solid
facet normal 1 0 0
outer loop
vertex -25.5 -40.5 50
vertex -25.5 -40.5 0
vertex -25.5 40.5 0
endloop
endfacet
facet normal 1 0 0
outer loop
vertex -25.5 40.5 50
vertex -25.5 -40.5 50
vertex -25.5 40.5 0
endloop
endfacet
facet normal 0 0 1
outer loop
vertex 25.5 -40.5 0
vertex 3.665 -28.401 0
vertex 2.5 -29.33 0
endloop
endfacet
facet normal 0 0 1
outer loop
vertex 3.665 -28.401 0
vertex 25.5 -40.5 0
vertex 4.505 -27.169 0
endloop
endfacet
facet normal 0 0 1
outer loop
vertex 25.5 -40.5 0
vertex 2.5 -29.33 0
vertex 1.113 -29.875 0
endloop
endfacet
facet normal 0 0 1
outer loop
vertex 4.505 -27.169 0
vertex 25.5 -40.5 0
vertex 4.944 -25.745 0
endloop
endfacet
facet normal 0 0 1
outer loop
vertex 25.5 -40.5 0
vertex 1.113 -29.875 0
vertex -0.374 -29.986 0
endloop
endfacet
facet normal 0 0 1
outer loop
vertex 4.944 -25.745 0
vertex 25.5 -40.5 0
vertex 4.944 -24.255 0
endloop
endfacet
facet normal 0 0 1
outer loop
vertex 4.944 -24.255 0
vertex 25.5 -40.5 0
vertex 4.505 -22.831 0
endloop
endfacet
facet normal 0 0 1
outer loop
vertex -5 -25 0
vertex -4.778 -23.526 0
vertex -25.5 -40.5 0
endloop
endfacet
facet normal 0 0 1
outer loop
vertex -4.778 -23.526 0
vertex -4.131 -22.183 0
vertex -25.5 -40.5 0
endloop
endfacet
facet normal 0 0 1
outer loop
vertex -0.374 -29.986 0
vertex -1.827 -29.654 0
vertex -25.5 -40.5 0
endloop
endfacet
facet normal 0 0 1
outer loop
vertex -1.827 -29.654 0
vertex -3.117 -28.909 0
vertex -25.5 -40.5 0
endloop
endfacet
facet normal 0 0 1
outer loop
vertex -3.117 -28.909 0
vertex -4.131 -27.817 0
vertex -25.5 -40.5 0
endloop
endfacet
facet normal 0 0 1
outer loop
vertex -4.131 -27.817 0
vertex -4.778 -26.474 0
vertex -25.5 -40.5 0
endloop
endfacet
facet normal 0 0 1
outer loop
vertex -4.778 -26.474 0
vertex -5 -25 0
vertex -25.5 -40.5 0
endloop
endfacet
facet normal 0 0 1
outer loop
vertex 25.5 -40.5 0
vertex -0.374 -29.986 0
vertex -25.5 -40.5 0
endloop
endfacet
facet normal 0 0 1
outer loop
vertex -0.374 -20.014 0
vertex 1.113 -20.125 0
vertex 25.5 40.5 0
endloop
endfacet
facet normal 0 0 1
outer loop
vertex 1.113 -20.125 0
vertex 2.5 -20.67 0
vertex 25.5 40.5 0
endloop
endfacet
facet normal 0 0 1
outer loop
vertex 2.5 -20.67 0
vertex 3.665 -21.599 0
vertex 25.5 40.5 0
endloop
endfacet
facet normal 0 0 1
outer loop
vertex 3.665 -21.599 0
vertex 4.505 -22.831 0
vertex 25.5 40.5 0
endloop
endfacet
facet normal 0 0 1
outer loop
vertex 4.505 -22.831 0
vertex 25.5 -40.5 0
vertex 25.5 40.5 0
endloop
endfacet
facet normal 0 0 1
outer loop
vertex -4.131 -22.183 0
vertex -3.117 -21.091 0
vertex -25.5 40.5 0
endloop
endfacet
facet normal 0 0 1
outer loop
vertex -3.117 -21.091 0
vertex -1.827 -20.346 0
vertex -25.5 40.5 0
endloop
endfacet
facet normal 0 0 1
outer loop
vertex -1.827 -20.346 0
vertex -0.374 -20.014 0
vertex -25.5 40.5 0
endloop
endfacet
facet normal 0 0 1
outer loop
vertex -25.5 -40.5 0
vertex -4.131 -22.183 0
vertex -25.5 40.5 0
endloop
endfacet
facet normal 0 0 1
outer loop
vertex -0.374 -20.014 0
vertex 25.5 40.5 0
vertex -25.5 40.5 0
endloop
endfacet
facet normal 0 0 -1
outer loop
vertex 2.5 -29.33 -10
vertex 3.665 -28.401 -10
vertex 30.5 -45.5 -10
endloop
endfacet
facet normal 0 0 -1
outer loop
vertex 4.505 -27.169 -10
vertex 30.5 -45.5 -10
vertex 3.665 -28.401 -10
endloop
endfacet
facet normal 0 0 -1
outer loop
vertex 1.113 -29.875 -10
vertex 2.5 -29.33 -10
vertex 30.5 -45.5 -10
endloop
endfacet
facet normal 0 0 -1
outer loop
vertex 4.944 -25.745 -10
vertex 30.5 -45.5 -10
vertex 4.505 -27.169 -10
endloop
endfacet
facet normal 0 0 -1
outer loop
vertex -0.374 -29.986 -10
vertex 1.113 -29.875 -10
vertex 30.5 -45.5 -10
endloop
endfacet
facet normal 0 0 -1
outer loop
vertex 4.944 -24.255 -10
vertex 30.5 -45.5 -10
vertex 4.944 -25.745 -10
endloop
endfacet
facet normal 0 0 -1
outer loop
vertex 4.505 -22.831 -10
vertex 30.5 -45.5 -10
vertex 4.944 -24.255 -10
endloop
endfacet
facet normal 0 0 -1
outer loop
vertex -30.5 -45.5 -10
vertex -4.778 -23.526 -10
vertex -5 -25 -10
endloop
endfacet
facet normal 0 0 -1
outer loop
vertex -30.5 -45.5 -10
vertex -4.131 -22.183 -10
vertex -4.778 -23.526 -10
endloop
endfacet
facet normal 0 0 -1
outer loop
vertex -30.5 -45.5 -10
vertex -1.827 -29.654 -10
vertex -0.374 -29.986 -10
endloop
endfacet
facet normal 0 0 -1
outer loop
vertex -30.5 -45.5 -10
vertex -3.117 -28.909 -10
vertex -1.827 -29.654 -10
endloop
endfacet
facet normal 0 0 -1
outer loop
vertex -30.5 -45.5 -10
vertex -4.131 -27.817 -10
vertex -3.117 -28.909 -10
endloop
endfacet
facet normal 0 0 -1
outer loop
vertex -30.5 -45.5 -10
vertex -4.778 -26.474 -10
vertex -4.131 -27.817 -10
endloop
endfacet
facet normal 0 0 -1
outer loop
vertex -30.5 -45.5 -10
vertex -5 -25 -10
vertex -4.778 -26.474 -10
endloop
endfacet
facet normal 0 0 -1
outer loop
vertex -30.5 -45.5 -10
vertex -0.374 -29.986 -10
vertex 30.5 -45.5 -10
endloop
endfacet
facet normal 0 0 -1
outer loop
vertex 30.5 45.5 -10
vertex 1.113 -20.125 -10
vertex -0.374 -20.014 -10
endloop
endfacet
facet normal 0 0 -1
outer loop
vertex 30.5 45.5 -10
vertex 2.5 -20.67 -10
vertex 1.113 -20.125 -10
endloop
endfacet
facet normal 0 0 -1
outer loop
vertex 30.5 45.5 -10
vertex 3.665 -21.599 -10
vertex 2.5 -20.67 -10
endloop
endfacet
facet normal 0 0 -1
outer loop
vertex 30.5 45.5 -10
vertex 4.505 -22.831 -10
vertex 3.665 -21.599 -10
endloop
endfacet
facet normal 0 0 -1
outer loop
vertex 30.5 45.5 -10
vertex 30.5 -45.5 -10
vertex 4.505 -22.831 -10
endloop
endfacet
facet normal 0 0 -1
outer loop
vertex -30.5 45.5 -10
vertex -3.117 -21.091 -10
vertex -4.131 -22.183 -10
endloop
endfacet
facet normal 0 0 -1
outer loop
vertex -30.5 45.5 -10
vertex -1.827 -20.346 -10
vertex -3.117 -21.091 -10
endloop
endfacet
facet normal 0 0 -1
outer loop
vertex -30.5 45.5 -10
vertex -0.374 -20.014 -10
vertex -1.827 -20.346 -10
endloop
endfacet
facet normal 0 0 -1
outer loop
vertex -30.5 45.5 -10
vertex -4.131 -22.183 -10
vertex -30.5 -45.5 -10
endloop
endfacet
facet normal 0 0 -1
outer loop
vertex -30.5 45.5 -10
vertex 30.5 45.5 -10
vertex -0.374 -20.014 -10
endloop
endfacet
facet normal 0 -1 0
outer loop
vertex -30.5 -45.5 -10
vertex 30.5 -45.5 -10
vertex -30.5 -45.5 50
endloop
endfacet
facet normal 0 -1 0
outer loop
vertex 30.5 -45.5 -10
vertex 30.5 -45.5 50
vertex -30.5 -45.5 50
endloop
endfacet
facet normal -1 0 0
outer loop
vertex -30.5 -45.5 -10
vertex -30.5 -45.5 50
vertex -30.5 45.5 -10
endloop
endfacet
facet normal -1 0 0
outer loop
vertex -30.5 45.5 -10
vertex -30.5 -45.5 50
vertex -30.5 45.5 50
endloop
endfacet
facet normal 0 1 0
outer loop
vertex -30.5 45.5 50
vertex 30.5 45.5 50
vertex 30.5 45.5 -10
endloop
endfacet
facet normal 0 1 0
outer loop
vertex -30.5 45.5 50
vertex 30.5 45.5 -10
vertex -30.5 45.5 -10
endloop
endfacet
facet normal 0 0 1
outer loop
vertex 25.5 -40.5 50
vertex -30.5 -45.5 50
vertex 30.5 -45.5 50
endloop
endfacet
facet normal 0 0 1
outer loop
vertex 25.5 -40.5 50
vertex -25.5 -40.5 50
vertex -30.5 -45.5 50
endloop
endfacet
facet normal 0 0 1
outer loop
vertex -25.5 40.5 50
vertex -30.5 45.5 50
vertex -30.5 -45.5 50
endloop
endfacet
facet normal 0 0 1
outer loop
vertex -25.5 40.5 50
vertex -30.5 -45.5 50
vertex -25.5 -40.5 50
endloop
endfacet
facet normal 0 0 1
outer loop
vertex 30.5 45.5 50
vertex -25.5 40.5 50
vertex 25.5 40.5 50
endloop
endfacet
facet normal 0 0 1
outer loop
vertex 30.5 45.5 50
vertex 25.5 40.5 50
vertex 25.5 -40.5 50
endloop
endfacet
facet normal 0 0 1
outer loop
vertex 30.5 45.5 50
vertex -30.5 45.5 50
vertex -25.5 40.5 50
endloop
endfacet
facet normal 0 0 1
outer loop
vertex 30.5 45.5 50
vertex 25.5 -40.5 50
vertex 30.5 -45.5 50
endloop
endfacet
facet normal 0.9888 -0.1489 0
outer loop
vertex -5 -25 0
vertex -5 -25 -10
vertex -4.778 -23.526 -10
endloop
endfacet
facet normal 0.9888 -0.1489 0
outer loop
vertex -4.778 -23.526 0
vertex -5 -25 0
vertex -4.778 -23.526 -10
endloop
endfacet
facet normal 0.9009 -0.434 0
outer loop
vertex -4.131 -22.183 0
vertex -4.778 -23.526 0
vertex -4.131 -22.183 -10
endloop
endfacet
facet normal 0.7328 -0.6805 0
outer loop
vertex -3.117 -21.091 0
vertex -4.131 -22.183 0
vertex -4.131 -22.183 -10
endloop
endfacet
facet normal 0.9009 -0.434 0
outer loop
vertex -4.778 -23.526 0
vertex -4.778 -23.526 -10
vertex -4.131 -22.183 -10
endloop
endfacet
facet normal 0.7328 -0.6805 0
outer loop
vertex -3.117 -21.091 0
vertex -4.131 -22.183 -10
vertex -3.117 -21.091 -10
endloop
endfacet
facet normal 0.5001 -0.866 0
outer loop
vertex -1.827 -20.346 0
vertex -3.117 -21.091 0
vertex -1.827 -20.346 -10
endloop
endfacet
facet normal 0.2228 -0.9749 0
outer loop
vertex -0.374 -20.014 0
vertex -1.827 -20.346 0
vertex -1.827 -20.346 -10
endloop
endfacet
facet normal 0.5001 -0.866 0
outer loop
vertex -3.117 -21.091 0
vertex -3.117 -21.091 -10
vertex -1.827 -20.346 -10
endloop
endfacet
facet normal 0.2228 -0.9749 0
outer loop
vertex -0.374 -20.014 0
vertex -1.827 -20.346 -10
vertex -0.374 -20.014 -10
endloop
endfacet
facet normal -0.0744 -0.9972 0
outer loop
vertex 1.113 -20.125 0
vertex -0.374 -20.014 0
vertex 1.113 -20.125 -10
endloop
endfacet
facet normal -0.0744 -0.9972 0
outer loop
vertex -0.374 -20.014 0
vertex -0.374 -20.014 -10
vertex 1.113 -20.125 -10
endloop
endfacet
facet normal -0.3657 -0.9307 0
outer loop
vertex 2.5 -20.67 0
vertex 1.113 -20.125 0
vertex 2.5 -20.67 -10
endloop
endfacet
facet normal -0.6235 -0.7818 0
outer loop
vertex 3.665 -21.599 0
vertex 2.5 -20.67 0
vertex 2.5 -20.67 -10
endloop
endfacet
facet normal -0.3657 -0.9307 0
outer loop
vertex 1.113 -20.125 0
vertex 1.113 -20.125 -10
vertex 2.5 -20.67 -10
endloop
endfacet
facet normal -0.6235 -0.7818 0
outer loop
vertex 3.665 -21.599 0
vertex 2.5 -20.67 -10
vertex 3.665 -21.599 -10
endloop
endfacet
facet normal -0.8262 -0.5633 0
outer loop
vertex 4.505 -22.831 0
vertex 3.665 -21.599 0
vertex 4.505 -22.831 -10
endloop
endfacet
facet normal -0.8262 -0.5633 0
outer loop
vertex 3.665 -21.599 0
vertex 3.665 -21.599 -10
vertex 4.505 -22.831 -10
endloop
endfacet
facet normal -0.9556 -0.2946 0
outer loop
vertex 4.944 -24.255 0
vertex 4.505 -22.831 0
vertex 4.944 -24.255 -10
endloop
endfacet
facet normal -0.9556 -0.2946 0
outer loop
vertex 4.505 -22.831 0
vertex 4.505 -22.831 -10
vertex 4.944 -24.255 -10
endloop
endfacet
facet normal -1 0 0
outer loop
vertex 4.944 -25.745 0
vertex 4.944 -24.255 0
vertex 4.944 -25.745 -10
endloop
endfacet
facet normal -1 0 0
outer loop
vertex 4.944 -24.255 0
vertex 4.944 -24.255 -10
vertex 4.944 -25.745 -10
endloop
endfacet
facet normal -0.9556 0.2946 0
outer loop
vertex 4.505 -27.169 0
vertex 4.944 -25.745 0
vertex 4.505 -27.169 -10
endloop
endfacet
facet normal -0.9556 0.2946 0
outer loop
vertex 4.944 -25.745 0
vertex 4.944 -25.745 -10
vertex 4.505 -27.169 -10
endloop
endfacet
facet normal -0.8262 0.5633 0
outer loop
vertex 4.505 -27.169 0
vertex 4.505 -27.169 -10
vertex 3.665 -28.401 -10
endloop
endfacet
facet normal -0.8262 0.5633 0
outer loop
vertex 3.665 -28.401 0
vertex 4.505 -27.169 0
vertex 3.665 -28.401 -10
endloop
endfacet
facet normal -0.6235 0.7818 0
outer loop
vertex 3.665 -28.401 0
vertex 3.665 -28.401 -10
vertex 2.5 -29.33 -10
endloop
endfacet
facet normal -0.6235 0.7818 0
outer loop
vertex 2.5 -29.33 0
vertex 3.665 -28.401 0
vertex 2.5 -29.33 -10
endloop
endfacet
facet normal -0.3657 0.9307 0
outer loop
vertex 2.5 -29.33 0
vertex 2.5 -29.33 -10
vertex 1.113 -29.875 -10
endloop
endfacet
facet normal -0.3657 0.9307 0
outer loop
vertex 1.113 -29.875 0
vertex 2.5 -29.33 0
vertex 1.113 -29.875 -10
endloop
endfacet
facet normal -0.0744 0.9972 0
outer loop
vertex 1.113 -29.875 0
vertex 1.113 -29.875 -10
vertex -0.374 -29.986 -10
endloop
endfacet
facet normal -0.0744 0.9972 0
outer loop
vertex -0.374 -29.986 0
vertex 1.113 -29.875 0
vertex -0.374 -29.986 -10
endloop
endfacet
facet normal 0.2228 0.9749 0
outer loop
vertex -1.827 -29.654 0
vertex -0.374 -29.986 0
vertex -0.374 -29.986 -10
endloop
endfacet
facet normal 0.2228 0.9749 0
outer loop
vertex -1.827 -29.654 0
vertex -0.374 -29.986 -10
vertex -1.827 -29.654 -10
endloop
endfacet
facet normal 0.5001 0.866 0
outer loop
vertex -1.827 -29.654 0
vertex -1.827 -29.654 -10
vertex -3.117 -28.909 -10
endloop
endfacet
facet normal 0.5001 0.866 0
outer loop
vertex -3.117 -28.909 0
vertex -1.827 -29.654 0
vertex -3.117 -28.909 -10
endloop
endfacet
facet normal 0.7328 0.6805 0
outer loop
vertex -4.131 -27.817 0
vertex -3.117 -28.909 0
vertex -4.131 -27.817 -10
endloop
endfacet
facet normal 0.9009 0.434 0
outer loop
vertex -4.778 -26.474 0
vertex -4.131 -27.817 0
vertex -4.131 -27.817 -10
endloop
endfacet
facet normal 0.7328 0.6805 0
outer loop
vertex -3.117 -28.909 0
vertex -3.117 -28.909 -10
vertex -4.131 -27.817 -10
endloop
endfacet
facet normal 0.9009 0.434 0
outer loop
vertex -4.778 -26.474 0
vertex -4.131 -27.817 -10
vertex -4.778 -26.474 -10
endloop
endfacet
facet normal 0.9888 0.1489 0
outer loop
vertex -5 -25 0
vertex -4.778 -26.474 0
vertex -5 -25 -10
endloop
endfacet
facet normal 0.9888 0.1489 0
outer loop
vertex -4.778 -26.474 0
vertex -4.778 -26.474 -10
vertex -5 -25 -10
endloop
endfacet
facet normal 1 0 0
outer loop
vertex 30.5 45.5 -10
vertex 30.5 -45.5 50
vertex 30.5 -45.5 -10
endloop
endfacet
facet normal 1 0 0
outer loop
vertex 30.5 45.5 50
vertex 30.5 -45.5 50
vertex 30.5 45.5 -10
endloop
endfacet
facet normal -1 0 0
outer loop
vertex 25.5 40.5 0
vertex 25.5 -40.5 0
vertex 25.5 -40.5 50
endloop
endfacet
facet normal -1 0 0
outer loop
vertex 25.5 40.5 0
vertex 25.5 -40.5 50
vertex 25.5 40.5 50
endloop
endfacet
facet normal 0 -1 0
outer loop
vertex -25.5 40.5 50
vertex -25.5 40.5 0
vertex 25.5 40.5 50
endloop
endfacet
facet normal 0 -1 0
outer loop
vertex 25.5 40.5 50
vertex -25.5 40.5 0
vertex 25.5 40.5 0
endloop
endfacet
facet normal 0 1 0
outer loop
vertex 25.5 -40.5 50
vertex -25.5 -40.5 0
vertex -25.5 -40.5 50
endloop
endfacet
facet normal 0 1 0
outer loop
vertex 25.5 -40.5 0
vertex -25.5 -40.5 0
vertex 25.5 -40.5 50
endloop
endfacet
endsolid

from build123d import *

# Parameters (mm, degrees)
SKETCH1_W           = 61
SKETCH1_H           = 91
SKETCH1_W_2         = 51
SKETCH1_H_2         = 81
BOSS_EXTRUDE1_DEPTH = 50
SKETCH2_W           = 61
SKETCH2_H           = 91
BOSS_EXTRUDE2_DEPTH = 10
SKETCH3_R           = 5
CUT_EXTRUDE1_DEPTH  = 10


with BuildPart() as part:
    # Sketch1 → Boss-Extrude1 (new body)
    with BuildSketch(Plane.XY):
        Rectangle(SKETCH1_W, SKETCH1_H)
        Rectangle(SKETCH1_W_2, SKETCH1_H_2, mode=Mode.SUBTRACT)
    extrude(amount=BOSS_EXTRUDE1_DEPTH)

    # Sketch2 → Boss-Extrude2 (add)
    with BuildSketch(Plane(origin=(0, 0, 0), x_dir=(-1, 0, 0), z_dir=(0, 0, -1))):
        Rectangle(SKETCH2_W, SKETCH2_H)
    extrude(amount=BOSS_EXTRUDE2_DEPTH)

    # Sketch3 → Cut-Extrude1 (cut)
    with BuildSketch(Plane(origin=(0, 0, -10), x_dir=(-1, 0, 0), z_dir=(0, 0, -1))):
        with Locations((0, -25)):
            Circle(SKETCH3_R)
    extrude(amount=-CUT_EXTRUDE1_DEPTH, mode=Mode.SUBTRACT)


solid = part.part
